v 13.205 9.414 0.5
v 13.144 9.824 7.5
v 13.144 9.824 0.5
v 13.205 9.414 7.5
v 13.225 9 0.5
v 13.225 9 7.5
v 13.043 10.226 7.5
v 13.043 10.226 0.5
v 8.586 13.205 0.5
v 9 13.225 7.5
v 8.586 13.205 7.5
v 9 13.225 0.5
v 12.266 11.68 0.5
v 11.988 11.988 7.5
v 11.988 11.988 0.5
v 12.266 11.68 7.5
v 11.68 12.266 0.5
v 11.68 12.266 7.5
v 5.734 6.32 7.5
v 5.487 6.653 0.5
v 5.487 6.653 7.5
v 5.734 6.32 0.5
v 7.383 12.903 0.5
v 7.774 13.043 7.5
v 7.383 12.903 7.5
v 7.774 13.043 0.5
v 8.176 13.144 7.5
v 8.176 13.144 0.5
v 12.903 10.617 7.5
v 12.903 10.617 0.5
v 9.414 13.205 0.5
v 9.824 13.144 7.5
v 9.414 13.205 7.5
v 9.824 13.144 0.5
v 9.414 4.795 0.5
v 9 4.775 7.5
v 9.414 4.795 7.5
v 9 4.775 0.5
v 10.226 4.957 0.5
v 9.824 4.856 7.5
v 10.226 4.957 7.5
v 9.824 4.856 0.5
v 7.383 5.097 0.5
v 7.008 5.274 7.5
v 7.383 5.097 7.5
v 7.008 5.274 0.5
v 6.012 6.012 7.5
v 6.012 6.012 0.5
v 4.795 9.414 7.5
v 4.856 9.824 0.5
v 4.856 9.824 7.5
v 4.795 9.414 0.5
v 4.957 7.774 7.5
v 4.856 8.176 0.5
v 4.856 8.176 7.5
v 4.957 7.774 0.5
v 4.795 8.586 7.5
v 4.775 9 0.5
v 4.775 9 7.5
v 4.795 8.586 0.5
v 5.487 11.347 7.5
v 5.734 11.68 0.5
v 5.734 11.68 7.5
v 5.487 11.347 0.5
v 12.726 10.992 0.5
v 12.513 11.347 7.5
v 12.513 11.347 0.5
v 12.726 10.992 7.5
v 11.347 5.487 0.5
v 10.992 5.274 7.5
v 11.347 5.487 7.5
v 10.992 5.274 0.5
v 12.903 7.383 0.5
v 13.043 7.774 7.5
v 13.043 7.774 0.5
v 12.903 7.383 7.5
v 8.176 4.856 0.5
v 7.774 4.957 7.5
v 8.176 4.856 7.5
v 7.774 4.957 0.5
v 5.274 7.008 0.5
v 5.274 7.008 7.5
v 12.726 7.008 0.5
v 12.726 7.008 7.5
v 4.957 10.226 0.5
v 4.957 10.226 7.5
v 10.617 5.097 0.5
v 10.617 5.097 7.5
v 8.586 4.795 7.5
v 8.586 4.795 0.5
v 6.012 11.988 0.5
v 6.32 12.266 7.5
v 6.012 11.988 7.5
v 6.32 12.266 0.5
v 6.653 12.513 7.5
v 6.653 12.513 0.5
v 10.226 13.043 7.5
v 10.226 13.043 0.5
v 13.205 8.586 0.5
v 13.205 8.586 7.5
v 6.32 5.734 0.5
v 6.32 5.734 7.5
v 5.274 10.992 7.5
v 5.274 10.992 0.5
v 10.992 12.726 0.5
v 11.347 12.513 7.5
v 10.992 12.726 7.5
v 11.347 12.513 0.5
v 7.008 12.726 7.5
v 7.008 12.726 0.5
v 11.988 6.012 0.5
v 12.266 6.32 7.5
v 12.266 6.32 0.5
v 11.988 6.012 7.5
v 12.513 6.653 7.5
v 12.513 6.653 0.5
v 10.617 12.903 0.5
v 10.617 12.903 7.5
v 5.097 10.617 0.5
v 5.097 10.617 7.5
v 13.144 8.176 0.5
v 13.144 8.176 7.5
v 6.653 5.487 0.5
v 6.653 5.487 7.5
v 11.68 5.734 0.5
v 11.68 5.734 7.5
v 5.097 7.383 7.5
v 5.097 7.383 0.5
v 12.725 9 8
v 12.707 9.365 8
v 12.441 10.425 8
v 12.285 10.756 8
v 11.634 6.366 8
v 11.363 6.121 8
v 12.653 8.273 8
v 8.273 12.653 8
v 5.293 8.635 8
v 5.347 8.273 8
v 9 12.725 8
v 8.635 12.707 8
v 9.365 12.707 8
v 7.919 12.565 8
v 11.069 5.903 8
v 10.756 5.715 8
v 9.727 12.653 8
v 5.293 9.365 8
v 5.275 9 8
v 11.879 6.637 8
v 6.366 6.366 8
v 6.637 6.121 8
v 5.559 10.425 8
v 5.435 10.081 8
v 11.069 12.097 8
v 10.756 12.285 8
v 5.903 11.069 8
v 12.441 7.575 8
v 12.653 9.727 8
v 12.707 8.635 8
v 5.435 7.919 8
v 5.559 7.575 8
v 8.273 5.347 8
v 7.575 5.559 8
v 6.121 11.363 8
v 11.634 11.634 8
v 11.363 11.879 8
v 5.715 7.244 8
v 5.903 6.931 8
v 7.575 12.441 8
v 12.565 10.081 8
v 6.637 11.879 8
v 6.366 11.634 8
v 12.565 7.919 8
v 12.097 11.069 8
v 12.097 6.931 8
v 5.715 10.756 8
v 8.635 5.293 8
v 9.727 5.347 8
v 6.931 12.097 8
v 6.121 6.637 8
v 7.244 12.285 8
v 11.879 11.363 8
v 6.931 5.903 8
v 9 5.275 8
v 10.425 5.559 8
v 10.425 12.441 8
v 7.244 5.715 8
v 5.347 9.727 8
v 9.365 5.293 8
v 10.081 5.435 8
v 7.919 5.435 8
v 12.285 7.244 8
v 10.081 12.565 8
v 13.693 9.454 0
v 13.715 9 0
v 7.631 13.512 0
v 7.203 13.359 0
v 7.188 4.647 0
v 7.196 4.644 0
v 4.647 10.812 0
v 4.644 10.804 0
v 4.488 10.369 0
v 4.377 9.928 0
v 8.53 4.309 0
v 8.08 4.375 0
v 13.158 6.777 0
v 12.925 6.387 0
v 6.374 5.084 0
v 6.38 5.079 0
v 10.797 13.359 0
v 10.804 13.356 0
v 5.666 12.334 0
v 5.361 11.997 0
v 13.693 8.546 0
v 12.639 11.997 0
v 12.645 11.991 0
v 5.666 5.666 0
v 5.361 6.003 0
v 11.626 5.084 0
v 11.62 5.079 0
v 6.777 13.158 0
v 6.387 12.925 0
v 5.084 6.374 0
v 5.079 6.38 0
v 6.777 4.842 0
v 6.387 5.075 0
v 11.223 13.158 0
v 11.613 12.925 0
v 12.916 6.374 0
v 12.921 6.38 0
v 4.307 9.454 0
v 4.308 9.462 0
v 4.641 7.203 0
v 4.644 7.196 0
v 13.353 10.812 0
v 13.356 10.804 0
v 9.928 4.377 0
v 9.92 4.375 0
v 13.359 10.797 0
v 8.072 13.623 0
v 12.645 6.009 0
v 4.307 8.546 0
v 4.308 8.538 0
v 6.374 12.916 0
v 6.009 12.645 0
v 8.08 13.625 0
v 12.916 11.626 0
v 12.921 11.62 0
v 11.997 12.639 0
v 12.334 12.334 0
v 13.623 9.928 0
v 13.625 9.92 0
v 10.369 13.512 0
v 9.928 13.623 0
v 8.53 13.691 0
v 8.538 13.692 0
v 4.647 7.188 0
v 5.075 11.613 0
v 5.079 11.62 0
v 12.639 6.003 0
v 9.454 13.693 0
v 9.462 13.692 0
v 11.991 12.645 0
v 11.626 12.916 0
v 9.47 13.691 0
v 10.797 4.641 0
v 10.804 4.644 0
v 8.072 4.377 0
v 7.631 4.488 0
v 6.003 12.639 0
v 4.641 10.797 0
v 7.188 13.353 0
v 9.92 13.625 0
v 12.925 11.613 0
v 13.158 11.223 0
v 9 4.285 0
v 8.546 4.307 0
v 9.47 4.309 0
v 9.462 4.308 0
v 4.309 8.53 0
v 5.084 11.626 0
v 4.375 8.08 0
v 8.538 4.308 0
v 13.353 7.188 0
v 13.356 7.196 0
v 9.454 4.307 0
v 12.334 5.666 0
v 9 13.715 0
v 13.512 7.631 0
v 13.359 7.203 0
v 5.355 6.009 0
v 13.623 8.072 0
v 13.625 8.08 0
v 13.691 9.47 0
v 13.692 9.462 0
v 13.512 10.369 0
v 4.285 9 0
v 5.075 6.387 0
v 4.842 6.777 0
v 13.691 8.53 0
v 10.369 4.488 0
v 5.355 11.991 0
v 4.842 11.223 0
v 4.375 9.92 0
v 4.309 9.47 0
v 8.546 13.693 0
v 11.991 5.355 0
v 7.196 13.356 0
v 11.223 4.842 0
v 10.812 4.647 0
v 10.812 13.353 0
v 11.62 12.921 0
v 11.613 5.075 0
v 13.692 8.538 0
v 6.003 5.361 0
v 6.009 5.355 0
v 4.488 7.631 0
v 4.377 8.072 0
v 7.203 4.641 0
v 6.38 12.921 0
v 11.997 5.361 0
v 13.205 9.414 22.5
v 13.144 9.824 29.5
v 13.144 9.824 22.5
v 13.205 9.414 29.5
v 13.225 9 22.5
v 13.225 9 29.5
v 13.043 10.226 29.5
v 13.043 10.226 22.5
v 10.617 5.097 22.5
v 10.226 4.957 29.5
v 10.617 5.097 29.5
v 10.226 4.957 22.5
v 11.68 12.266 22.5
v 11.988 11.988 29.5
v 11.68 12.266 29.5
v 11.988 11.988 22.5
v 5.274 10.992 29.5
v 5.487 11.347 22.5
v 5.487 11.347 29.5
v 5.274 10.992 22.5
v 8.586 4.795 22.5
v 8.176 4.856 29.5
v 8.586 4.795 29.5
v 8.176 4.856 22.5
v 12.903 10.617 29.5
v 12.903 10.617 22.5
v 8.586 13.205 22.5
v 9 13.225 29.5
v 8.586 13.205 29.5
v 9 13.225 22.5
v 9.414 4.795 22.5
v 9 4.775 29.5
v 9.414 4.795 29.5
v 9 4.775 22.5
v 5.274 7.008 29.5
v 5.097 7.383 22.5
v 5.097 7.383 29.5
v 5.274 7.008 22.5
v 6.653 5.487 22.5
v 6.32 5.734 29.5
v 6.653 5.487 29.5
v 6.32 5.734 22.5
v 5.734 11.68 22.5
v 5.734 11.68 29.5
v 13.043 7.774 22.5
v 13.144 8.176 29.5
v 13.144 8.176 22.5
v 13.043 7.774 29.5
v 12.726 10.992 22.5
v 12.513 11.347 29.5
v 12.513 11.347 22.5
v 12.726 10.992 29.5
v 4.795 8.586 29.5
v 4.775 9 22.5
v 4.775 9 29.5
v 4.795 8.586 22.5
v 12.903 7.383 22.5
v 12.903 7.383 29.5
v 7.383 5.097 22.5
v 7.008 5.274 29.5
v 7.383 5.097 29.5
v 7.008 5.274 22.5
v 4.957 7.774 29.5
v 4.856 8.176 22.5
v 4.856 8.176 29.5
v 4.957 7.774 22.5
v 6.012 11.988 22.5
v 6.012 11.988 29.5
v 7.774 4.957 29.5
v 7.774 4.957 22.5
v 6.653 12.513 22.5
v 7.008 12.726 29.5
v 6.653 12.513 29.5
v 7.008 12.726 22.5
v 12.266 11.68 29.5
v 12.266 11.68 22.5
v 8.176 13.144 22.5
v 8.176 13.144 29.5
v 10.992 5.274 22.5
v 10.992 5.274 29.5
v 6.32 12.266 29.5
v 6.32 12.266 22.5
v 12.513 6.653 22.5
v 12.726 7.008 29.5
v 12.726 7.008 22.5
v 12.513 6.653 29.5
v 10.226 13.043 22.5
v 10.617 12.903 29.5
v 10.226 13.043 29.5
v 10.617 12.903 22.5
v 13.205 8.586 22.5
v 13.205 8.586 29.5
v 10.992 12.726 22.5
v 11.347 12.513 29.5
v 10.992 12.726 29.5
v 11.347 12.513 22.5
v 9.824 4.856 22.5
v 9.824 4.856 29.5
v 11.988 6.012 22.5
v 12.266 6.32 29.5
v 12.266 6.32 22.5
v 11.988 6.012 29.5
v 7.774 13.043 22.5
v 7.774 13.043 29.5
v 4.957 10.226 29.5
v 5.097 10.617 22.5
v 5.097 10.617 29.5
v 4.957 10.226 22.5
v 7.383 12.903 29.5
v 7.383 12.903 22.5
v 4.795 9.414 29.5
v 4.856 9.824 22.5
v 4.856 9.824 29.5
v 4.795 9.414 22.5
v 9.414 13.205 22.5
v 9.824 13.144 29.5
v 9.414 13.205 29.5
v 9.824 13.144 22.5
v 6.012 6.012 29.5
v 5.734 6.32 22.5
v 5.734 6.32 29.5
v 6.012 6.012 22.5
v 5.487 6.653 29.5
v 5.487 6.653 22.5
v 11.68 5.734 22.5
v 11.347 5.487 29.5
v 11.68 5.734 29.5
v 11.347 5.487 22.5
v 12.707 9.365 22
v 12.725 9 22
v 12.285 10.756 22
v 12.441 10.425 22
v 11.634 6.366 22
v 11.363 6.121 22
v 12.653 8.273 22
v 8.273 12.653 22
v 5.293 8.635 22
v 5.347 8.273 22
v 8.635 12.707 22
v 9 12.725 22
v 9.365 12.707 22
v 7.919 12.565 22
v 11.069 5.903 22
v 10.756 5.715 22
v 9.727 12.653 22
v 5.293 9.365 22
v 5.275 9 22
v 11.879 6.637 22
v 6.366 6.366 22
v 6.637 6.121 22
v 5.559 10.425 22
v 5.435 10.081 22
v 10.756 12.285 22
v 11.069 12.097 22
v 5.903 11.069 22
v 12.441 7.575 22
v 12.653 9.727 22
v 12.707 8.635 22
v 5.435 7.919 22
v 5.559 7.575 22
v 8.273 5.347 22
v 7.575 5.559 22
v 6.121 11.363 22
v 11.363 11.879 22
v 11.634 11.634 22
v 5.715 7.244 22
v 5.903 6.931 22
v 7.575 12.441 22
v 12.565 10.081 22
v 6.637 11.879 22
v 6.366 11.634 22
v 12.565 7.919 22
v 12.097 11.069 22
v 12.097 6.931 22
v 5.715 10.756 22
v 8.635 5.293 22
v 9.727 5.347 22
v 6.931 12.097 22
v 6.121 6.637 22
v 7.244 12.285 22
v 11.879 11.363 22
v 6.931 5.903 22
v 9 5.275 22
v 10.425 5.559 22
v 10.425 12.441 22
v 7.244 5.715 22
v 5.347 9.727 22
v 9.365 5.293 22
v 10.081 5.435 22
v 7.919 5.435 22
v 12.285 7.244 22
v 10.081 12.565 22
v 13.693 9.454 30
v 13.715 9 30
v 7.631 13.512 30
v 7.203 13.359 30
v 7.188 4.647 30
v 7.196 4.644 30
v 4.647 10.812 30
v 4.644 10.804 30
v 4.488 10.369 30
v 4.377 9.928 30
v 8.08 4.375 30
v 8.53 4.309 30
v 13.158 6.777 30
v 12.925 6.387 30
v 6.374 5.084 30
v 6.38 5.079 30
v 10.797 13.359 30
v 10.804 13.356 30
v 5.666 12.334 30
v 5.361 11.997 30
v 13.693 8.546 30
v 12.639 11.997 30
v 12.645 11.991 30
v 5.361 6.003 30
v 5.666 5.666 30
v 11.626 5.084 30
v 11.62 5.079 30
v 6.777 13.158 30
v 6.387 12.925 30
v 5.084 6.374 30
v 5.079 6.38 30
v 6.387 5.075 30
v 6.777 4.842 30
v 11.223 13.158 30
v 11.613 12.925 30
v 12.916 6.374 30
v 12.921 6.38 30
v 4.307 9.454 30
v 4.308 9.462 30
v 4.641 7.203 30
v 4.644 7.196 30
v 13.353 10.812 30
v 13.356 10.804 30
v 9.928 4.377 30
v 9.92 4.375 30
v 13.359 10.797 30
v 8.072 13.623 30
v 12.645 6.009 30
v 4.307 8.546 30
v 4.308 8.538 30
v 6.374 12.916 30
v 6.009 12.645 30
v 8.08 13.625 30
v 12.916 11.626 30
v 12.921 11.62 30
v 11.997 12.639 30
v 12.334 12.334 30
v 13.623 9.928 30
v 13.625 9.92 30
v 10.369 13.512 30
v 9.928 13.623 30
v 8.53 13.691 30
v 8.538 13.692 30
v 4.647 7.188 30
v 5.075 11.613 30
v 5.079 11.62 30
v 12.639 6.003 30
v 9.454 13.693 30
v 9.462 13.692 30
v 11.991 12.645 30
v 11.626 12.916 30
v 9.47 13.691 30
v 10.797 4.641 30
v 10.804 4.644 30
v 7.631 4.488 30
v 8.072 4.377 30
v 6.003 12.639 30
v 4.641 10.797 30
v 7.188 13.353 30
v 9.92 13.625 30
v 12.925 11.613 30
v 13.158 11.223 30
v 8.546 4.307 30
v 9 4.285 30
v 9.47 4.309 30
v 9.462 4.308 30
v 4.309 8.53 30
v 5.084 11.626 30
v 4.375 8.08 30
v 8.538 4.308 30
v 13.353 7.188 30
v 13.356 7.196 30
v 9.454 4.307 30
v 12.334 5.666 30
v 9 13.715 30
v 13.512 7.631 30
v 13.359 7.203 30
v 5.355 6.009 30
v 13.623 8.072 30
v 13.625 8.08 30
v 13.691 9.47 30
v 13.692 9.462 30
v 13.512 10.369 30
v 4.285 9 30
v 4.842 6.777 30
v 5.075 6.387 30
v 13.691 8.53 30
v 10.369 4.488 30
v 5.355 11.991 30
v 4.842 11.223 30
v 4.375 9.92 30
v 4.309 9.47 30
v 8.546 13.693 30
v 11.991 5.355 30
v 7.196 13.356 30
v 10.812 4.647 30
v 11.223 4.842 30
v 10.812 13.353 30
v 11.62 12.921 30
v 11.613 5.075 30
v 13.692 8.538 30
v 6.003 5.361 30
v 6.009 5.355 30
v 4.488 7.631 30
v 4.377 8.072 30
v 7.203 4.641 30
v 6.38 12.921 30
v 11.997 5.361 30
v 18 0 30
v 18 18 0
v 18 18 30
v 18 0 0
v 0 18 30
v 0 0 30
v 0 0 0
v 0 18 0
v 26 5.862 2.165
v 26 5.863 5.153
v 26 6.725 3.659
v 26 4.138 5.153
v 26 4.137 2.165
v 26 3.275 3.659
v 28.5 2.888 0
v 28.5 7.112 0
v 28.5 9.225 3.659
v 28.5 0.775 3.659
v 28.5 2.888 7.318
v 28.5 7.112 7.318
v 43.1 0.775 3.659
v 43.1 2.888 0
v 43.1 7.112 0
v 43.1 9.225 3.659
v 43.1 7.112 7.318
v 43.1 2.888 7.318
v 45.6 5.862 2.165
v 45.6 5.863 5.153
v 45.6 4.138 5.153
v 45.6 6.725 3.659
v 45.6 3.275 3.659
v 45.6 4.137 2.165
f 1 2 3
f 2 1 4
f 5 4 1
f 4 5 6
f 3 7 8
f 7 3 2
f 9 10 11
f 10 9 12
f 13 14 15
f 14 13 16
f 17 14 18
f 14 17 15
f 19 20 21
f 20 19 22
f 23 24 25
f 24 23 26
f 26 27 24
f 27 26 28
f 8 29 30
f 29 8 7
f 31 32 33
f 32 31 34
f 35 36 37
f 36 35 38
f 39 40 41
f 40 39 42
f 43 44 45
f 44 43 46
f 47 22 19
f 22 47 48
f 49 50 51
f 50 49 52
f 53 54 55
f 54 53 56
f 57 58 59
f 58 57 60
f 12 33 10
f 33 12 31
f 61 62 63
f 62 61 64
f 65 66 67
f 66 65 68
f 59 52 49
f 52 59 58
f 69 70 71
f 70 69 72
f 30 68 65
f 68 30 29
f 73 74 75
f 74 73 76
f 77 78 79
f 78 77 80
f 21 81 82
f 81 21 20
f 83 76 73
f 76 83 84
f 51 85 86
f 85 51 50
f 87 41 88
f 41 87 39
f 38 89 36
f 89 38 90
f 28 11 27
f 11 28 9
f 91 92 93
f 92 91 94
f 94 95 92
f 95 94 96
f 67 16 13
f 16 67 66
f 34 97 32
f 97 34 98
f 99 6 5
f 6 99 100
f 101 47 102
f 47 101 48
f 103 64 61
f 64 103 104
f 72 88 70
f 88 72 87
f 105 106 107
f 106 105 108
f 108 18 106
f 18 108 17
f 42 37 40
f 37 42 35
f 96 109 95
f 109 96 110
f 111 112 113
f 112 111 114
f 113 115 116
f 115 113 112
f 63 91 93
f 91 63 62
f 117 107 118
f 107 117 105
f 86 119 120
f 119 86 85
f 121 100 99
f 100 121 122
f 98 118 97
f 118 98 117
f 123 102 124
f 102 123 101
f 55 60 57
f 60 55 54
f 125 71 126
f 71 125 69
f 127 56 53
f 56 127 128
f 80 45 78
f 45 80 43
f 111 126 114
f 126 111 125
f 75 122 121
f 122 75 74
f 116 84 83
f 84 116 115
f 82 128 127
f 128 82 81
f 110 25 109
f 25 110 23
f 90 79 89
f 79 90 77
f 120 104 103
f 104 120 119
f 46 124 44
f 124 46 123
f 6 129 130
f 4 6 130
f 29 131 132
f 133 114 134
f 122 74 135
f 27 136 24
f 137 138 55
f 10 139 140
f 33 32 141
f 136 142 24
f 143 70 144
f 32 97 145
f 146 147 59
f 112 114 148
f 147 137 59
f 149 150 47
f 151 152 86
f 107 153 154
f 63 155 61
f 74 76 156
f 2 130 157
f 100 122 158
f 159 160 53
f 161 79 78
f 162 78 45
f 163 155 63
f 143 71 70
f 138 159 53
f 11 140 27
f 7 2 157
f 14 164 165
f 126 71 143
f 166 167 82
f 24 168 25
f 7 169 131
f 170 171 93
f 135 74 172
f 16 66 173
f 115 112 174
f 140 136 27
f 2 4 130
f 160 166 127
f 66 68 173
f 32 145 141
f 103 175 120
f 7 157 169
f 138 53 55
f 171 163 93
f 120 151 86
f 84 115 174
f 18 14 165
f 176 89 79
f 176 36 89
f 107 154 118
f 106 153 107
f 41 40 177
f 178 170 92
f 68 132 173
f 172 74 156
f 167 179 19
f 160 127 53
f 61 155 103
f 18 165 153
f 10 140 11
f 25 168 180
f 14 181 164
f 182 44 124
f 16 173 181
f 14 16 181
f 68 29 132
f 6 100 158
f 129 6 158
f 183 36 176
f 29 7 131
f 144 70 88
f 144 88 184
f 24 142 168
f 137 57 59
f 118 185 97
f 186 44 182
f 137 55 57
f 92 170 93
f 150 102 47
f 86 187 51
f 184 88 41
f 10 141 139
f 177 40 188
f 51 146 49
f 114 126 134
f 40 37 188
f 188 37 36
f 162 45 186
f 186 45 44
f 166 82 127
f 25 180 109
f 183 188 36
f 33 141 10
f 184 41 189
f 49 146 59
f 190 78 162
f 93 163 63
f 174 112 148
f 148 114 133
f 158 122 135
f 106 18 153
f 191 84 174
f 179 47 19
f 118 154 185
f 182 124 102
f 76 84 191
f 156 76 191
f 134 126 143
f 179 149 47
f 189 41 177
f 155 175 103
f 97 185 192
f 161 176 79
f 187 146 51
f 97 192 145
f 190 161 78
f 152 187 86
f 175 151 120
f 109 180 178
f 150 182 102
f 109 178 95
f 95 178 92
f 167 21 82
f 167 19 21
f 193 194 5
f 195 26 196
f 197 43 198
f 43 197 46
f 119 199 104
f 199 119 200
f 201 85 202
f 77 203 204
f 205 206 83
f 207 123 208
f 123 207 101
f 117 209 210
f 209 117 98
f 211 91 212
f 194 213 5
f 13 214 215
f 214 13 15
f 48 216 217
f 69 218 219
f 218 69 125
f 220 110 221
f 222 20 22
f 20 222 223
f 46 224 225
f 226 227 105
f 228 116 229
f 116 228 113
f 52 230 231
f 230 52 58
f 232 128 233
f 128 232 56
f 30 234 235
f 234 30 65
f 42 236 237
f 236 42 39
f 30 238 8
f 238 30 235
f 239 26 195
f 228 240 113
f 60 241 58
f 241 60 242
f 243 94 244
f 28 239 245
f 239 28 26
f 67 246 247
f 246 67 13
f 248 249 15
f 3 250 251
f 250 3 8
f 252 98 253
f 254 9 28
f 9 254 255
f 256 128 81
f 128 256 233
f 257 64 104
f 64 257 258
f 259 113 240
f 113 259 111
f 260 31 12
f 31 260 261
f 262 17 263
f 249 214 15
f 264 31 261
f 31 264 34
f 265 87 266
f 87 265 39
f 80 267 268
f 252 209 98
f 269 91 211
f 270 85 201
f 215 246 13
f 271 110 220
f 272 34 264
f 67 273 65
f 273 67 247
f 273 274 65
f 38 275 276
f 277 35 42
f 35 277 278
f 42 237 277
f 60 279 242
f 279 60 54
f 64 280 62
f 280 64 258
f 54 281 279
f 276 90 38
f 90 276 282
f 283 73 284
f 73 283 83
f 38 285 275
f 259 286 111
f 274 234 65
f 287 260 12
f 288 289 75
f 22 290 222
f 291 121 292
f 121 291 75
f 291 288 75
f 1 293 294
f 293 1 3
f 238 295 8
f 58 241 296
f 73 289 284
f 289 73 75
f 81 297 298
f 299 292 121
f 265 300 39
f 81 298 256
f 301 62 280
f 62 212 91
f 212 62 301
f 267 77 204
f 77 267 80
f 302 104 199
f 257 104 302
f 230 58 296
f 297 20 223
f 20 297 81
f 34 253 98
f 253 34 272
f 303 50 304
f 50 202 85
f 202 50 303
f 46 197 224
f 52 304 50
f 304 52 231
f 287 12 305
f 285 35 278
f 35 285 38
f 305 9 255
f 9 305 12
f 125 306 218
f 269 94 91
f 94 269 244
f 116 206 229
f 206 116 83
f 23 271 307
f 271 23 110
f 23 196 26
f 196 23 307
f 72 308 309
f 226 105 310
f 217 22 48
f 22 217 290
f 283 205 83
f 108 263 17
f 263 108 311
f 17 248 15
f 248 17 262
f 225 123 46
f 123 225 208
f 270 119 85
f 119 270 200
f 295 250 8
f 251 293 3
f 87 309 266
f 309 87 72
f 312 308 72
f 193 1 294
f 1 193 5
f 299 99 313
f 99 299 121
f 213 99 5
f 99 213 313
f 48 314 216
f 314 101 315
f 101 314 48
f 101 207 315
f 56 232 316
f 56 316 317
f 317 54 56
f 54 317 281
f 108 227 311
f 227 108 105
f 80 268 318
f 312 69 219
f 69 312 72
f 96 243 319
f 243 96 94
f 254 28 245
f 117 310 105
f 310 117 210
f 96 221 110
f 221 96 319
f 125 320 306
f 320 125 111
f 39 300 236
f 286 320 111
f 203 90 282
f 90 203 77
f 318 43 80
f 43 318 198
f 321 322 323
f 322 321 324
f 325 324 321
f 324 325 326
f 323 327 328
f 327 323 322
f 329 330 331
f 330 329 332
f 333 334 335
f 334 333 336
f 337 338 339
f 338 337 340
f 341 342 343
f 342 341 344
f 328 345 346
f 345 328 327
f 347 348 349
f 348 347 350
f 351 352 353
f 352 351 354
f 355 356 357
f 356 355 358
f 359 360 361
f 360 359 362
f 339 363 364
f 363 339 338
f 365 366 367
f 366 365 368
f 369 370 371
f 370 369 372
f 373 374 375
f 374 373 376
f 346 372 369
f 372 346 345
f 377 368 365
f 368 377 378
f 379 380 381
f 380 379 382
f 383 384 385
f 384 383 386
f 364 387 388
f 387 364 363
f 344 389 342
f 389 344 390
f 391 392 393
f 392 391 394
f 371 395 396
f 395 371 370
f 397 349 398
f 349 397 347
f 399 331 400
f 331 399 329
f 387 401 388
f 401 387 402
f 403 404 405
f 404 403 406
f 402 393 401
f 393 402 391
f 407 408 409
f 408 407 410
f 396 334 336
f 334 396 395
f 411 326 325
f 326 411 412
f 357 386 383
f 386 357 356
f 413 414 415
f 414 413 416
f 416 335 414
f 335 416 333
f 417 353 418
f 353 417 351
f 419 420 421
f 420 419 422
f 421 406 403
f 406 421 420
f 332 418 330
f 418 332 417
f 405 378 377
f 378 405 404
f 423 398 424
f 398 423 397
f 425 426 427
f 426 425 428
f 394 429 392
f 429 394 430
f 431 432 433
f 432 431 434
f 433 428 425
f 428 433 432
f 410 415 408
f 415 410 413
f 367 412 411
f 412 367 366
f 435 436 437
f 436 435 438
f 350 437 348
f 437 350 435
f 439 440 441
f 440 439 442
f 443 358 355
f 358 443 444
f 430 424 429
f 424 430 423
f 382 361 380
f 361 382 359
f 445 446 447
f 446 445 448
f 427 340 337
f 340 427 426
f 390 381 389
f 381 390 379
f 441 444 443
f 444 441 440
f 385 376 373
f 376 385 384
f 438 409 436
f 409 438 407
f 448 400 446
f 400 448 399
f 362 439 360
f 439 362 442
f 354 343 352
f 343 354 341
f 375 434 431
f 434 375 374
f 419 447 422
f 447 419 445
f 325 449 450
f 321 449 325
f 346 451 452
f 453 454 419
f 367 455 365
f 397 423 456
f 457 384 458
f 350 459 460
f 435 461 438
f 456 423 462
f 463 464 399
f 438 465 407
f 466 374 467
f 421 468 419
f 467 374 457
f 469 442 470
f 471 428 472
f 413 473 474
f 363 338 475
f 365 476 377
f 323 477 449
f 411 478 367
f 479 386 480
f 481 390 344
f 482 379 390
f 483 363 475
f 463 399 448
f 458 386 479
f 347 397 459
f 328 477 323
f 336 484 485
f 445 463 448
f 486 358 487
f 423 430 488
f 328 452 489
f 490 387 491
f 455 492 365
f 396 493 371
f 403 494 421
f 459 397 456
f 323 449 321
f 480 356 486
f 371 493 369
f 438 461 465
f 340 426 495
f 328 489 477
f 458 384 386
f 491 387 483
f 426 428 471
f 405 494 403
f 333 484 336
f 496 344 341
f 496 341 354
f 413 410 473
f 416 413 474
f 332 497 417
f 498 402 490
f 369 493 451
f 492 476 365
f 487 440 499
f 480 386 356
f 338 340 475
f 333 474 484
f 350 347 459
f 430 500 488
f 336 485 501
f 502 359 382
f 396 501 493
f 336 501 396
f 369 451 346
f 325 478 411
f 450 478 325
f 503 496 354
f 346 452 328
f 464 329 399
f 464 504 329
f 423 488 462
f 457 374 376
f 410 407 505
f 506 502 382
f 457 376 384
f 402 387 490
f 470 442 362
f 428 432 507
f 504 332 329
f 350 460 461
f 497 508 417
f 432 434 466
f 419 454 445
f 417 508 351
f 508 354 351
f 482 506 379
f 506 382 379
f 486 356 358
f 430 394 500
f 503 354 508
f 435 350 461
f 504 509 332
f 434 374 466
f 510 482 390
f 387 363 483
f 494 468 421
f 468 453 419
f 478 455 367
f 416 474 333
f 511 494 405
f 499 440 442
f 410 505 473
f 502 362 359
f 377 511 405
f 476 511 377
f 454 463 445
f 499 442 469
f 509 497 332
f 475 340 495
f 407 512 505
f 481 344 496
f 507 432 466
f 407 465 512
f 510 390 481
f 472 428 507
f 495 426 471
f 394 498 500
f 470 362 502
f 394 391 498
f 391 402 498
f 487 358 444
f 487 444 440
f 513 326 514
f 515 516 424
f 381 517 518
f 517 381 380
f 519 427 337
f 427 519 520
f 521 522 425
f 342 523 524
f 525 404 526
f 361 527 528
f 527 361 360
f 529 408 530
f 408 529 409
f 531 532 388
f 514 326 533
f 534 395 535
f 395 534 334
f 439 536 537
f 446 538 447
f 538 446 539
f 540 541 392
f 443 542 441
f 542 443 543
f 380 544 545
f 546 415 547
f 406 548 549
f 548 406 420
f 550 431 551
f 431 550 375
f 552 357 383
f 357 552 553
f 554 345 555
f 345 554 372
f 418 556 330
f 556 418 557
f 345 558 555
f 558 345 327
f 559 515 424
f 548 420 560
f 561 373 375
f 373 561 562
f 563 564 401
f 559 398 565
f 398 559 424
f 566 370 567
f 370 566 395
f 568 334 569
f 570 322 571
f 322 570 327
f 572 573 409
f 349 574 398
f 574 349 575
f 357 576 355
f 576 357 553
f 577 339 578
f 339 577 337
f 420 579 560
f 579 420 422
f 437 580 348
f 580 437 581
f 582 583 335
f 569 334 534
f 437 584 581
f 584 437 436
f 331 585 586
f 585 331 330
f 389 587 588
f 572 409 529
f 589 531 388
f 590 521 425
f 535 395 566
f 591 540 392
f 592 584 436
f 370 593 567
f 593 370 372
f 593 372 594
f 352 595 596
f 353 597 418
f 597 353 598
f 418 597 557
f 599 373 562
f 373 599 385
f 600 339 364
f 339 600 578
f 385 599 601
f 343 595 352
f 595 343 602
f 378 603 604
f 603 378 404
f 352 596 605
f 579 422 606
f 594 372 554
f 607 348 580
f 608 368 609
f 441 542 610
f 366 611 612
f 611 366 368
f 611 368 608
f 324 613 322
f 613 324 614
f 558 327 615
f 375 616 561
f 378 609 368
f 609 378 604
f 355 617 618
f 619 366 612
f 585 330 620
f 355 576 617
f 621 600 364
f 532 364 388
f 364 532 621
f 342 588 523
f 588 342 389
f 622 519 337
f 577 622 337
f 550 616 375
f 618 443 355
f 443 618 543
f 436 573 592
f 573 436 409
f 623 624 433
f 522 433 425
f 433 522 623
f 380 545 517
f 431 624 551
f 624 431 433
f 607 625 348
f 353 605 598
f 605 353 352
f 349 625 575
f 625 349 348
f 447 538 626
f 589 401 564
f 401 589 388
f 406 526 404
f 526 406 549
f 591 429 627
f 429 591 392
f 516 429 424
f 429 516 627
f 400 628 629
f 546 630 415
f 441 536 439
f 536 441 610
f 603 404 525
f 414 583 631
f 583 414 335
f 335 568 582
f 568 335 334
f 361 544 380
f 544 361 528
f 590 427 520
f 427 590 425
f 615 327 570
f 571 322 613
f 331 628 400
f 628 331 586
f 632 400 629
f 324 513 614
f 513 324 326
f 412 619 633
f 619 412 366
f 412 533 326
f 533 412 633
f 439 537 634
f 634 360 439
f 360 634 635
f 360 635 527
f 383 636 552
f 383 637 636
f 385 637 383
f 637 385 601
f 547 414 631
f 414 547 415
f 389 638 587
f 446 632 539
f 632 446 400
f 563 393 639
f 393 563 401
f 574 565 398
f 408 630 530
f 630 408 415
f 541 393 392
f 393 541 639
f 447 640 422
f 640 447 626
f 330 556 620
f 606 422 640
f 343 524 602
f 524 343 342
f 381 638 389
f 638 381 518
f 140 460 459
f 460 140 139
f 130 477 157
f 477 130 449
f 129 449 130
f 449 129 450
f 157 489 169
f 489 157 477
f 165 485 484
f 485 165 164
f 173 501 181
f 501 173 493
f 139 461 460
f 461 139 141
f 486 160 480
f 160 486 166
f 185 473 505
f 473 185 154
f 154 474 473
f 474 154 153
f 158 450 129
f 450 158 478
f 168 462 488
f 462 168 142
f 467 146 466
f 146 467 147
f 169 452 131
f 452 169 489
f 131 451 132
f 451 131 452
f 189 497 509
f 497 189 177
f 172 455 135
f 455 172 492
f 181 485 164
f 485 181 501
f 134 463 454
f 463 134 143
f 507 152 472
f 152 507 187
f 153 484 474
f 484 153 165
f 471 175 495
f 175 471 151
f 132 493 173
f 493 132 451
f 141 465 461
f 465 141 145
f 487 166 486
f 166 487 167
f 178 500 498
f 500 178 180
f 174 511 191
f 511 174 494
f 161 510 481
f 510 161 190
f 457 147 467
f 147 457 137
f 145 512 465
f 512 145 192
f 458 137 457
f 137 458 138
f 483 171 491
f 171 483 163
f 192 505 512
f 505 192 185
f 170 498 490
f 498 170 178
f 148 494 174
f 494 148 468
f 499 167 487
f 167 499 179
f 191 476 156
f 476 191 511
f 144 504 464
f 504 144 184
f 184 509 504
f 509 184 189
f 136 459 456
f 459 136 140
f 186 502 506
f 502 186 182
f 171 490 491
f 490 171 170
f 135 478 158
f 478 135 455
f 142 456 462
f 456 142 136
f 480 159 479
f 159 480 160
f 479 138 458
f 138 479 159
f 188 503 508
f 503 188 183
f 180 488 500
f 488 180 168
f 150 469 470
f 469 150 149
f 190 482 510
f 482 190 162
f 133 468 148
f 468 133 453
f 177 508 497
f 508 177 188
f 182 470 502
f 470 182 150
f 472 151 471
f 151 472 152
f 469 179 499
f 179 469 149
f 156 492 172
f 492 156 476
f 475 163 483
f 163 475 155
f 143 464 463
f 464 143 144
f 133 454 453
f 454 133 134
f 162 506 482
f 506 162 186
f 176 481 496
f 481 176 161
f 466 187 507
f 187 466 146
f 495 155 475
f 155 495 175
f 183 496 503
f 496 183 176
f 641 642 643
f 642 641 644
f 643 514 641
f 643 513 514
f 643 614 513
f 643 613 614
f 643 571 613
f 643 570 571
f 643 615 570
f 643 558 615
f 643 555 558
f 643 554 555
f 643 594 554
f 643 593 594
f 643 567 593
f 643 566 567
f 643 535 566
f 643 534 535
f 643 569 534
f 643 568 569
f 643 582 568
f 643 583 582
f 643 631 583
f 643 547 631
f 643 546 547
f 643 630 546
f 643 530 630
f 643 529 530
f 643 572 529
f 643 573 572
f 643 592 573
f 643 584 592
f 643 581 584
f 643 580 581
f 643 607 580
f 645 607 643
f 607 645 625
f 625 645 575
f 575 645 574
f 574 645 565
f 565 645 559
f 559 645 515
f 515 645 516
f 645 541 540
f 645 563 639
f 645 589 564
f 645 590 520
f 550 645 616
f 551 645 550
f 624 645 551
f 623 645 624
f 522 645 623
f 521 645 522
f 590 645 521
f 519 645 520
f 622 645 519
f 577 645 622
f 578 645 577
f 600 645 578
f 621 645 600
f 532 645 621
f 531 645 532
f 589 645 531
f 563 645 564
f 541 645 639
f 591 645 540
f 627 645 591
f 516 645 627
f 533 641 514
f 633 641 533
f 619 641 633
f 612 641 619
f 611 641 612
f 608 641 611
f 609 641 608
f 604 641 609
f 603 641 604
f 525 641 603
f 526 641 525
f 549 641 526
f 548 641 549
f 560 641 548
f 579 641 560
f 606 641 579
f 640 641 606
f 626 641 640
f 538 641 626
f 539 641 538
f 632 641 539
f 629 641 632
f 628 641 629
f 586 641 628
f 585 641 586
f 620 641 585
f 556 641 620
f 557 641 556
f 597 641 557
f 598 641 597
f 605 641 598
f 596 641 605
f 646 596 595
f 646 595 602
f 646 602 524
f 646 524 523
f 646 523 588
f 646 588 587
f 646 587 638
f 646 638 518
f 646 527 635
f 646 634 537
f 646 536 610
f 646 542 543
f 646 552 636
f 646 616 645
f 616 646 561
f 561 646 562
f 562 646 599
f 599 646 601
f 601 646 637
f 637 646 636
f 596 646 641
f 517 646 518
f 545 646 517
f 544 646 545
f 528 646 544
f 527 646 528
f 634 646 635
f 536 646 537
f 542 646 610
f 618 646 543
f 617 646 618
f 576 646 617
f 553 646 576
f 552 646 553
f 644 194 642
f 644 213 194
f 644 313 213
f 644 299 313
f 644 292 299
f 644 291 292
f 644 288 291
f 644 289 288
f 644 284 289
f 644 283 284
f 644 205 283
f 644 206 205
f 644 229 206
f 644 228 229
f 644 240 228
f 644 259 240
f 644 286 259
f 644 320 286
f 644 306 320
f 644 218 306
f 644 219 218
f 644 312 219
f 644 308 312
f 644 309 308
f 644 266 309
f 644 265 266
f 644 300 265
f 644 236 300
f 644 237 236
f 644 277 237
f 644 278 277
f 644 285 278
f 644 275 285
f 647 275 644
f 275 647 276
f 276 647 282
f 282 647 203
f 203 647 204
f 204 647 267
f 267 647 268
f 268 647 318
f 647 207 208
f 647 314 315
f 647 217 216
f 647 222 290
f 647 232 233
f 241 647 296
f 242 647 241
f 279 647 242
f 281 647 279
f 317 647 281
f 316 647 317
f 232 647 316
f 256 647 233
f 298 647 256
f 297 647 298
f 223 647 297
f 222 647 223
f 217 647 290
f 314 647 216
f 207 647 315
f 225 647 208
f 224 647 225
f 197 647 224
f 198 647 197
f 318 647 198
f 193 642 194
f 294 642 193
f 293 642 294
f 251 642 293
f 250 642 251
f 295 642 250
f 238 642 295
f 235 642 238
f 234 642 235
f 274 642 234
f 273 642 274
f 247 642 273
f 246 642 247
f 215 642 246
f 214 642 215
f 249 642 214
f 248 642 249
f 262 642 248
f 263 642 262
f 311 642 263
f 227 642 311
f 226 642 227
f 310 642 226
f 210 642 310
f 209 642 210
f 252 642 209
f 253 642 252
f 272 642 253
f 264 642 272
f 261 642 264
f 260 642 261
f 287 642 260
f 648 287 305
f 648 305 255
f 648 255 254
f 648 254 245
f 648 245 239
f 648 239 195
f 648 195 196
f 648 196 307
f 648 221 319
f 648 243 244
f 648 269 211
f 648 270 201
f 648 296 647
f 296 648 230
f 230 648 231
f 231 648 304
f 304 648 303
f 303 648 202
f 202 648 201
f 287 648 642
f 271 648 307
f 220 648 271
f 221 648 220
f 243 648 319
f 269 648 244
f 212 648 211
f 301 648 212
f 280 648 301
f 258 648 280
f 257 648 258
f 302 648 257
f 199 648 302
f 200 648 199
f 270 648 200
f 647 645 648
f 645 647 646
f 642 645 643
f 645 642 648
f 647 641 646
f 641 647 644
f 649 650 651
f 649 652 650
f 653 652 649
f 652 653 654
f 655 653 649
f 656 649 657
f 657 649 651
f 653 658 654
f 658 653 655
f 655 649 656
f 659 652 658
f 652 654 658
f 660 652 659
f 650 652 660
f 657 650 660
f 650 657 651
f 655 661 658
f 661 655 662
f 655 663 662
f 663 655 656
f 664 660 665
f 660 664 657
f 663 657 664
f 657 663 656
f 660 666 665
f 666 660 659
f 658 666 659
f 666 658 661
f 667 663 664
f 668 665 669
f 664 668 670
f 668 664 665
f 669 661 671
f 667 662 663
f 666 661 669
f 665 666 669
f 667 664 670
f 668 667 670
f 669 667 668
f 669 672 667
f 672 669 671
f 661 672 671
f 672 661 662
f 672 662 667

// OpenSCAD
// file: ../magnet_well.scad
// magnet_well.scad
// version: 0.2.0
// Shared disc-magnet press-fit recipes and well cutters. Product parts pass a
// named recipe so identical magnet specifications cannot drift by caller.

$fn = 64;
EPS = 0.01;

MAGNET_RECIPE_BORE_DIAMETER = 0;
MAGNET_RECIPE_RIB_TIP_DIAMETER = 1;
MAGNET_RECIPE_RIB_PROTRUSION = 2;
MAGNET_RECIPE_WELL_DEPTH = 3;
MAGNET_RECIPE_CHAMFER = 4;
MAGNET_RECIPE_RIB_COUNT = 5;
MAGNET_RECIPE_RIB_WIDTH = 6;
MAGNET_RECIPE_FIELD_COUNT = 7;

// Canonical product recipe for a 6 x 1.5mm disc magnet. The proven 0.25mm
// radial crush defines the 5.60mm rib-tip diameter from the 6.10mm bore.
// The selected 2.30mm depth remains pending physical confirmation.
function hutchfinity_magnet_recipe_6x1_5() =
    let(
        bore_diameter = 6.10,
        rib_protrusion = 0.25
    ) [
        bore_diameter,
        bore_diameter - 2 * rib_protrusion,
        rib_protrusion,
        2.30,
        0.30,
        8,
        0.80
    ];

function hutchfinity_magnet_recipe_bore_diameter(recipe) =
    recipe[MAGNET_RECIPE_BORE_DIAMETER];
function hutchfinity_magnet_recipe_rib_tip_diameter(recipe) =
    recipe[MAGNET_RECIPE_RIB_TIP_DIAMETER];
function hutchfinity_magnet_recipe_rib_protrusion(recipe) =
    recipe[MAGNET_RECIPE_RIB_PROTRUSION];
function hutchfinity_magnet_recipe_well_depth(recipe) =
    recipe[MAGNET_RECIPE_WELL_DEPTH];
function hutchfinity_magnet_recipe_chamfer(recipe) =
    recipe[MAGNET_RECIPE_CHAMFER];
function hutchfinity_magnet_recipe_rib_count(recipe) =
    recipe[MAGNET_RECIPE_RIB_COUNT];
function hutchfinity_magnet_recipe_rib_width(recipe) =
    recipe[MAGNET_RECIPE_RIB_WIDTH];

function hutchfinity_magnet_recipe_is_valid(recipe) =
    is_list(recipe) &&
    len(recipe) == MAGNET_RECIPE_FIELD_COUNT &&
    hutchfinity_magnet_recipe_bore_diameter(recipe) > 0 &&
    hutchfinity_magnet_recipe_rib_tip_diameter(recipe) > 0 &&
    hutchfinity_magnet_recipe_rib_protrusion(recipe) >= 0 &&
    abs(
        hutchfinity_magnet_recipe_bore_diameter(recipe) -
        hutchfinity_magnet_recipe_rib_tip_diameter(recipe) -
        2 * hutchfinity_magnet_recipe_rib_protrusion(recipe)
    ) <= EPS &&
    hutchfinity_magnet_recipe_well_depth(recipe) > 0 &&
    hutchfinity_magnet_recipe_chamfer(recipe) >= 0 &&
    hutchfinity_magnet_recipe_rib_count(recipe) >= 3 &&
    hutchfinity_magnet_recipe_rib_width(recipe) > 0;

module hutchfinity_magnet_well_cut(
    position,
    recipe = hutchfinity_magnet_recipe_6x1_5(),
    z = 0
) {
    bore_diameter = hutchfinity_magnet_recipe_bore_diameter(recipe);
    rib_tip_diameter = hutchfinity_magnet_recipe_rib_tip_diameter(recipe);
    rib_protrusion = hutchfinity_magnet_recipe_rib_protrusion(recipe);
    well_depth = hutchfinity_magnet_recipe_well_depth(recipe);
    well_chamfer = hutchfinity_magnet_recipe_chamfer(recipe);
    rib_count = hutchfinity_magnet_recipe_rib_count(recipe);
    rib_width = hutchfinity_magnet_recipe_rib_width(recipe);
    bore_r = bore_diameter / 2;
    tip_r = rib_tip_diameter / 2;
    chamfer = min(well_chamfer, well_depth / 2);
    rib_depth = max(EPS, well_depth - chamfer);

    assert(hutchfinity_magnet_recipe_is_valid(recipe),
        "magnet recipe must contain one consistent bore, rib, depth, chamfer, count, and width");

    translate([position[0], position[1], z - EPS])
    union() {
        cylinder(r1=bore_r + chamfer, r2=bore_r, h=chamfer + EPS);

        translate([0, 0, chamfer])
        difference() {
            cylinder(r=bore_r, h=rib_depth + 2 * EPS);

            if (rib_protrusion > EPS) {
                for (i = [0 : rib_count - 1]) {
                    rotate([0, 0, i * (360 / rib_count)])
                    linear_extrude(height=rib_depth + 3 * EPS)
                    polygon([
                        [tip_r, 0],
                        [bore_r, -rib_width / 2],
                        [bore_r, rib_width / 2]
                    ]);
                }
            }
        }
    }
}

module hutchfinity_magnet_well_cuts(
    positions,
    recipe = hutchfinity_magnet_recipe_6x1_5(),
    z = 0
) {
    for (p = positions)
        hutchfinity_magnet_well_cut(p, recipe, z);
}
// file: ../peg.scad
// peg.scad
// version: 0.5.0
// Prototype laid-down hex peg for vertical Hutchfinity casing stacks.

$fn = 64;
EPS = 0.01;

// Diameter is point-to-point across the hex. The default matches the current
// casing socket default: 8.0mm nominal peg + 0.45mm socket clearance.
PEG_DIAMETER = 8.45;
// Two nominal 10 mm receivers leave 0.4 mm total axial allowance.
PEG_LENGTH = 19.6;
PEG_END_CHAMFER = 2.5;
PEG_CORE_SIDES = 6;
PEG_PRINT_FACE_ROTATION = 30;

function peg_tip_diameter(diameter, chamfer) = max(0.8, diameter - 2 * chamfer);
function peg_flat_to_flat_diameter(diameter, core_sides) =
    diameter * cos(180 / core_sides);

module chamfered_peg_core(diameter, length, chamfer, core_sides) {
    tip_d = peg_tip_diameter(diameter, chamfer);

    union() {
        cylinder(d1=tip_d, d2=diameter, h=chamfer, $fn=core_sides);
        translate([0, 0, chamfer])
            cylinder(d=diameter, h=max(EPS, length - 2 * chamfer), $fn=core_sides);
        translate([0, 0, length - chamfer])
            cylinder(d1=diameter, d2=tip_d, h=chamfer, $fn=core_sides);
    }
}

module hutchfinity_peg(
    diameter=PEG_DIAMETER,
    length=PEG_LENGTH,
    end_chamfer=PEG_END_CHAMFER,
    core_sides=PEG_CORE_SIDES
) {
    chamfer = min(end_chamfer, length / 2 - EPS);

    assert(diameter > 0 && length > 0, "peg diameter and length must be positive");
    assert(end_chamfer >= 0, "peg end chamfer must be non-negative");
    assert(core_sides >= 3, "peg core needs at least three sides");

    chamfered_peg_core(diameter, length, chamfer, core_sides);
}

module hutchfinity_peg_print_layout(
    diameter=PEG_DIAMETER,
    length=PEG_LENGTH,
    end_chamfer=PEG_END_CHAMFER,
    core_sides=PEG_CORE_SIDES,
    print_face_rotation=PEG_PRINT_FACE_ROTATION
) {
    translate([0, 0, peg_flat_to_flat_diameter(diameter, core_sides) / 2])
        rotate([0, 90, 0])
            rotate([0, 0, print_face_rotation])
                hutchfinity_peg(
                    diameter=diameter,
                    length=length,
                    end_chamfer=end_chamfer,
                    core_sides=core_sides
                );
}

hutchfinity_peg_print_layout();
// main file
// through_peg_socket_testbed.scad
// version: 0.1.1
// Unvalidated physical coupon for the continuous peg bore and insertion stop.
// Print whole to test fit; SECTION=true exposes the hourglass profile for review.

use <../casing.scad>;
use <../peg.scad>;

// Match the production casing's bore approximation for physical fit tests.
$fn = 32;
SECTION = false;
HEIGHT = 30;
BORE = 8.45;
THROAT_REDUCTION = 1.0;
DEPTH = min(10, (HEIGHT - 2) / 2);
PEG_LENGTH = 2 * DEPTH - 0.4;
END_CHAMFER = min(2.5, PEG_LENGTH / 4);

module stop_coupon(section=SECTION) {
    difference() {
        cube([18, 18, HEIGHT]);
        through_peg_socket_cut([9, 9], BORE, HEIGHT, DEPTH, 0.5,
            END_CHAMFER, THROAT_REDUCTION);
        if (section) translate([-1, -1, -1]) cube([20, 10, HEIGHT + 2]);
    }
}

stop_coupon();
translate([26, 5, 0]) hutchfinity_peg_print_layout(
    diameter=BORE, length=PEG_LENGTH, end_chamfer=END_CHAMFER);
